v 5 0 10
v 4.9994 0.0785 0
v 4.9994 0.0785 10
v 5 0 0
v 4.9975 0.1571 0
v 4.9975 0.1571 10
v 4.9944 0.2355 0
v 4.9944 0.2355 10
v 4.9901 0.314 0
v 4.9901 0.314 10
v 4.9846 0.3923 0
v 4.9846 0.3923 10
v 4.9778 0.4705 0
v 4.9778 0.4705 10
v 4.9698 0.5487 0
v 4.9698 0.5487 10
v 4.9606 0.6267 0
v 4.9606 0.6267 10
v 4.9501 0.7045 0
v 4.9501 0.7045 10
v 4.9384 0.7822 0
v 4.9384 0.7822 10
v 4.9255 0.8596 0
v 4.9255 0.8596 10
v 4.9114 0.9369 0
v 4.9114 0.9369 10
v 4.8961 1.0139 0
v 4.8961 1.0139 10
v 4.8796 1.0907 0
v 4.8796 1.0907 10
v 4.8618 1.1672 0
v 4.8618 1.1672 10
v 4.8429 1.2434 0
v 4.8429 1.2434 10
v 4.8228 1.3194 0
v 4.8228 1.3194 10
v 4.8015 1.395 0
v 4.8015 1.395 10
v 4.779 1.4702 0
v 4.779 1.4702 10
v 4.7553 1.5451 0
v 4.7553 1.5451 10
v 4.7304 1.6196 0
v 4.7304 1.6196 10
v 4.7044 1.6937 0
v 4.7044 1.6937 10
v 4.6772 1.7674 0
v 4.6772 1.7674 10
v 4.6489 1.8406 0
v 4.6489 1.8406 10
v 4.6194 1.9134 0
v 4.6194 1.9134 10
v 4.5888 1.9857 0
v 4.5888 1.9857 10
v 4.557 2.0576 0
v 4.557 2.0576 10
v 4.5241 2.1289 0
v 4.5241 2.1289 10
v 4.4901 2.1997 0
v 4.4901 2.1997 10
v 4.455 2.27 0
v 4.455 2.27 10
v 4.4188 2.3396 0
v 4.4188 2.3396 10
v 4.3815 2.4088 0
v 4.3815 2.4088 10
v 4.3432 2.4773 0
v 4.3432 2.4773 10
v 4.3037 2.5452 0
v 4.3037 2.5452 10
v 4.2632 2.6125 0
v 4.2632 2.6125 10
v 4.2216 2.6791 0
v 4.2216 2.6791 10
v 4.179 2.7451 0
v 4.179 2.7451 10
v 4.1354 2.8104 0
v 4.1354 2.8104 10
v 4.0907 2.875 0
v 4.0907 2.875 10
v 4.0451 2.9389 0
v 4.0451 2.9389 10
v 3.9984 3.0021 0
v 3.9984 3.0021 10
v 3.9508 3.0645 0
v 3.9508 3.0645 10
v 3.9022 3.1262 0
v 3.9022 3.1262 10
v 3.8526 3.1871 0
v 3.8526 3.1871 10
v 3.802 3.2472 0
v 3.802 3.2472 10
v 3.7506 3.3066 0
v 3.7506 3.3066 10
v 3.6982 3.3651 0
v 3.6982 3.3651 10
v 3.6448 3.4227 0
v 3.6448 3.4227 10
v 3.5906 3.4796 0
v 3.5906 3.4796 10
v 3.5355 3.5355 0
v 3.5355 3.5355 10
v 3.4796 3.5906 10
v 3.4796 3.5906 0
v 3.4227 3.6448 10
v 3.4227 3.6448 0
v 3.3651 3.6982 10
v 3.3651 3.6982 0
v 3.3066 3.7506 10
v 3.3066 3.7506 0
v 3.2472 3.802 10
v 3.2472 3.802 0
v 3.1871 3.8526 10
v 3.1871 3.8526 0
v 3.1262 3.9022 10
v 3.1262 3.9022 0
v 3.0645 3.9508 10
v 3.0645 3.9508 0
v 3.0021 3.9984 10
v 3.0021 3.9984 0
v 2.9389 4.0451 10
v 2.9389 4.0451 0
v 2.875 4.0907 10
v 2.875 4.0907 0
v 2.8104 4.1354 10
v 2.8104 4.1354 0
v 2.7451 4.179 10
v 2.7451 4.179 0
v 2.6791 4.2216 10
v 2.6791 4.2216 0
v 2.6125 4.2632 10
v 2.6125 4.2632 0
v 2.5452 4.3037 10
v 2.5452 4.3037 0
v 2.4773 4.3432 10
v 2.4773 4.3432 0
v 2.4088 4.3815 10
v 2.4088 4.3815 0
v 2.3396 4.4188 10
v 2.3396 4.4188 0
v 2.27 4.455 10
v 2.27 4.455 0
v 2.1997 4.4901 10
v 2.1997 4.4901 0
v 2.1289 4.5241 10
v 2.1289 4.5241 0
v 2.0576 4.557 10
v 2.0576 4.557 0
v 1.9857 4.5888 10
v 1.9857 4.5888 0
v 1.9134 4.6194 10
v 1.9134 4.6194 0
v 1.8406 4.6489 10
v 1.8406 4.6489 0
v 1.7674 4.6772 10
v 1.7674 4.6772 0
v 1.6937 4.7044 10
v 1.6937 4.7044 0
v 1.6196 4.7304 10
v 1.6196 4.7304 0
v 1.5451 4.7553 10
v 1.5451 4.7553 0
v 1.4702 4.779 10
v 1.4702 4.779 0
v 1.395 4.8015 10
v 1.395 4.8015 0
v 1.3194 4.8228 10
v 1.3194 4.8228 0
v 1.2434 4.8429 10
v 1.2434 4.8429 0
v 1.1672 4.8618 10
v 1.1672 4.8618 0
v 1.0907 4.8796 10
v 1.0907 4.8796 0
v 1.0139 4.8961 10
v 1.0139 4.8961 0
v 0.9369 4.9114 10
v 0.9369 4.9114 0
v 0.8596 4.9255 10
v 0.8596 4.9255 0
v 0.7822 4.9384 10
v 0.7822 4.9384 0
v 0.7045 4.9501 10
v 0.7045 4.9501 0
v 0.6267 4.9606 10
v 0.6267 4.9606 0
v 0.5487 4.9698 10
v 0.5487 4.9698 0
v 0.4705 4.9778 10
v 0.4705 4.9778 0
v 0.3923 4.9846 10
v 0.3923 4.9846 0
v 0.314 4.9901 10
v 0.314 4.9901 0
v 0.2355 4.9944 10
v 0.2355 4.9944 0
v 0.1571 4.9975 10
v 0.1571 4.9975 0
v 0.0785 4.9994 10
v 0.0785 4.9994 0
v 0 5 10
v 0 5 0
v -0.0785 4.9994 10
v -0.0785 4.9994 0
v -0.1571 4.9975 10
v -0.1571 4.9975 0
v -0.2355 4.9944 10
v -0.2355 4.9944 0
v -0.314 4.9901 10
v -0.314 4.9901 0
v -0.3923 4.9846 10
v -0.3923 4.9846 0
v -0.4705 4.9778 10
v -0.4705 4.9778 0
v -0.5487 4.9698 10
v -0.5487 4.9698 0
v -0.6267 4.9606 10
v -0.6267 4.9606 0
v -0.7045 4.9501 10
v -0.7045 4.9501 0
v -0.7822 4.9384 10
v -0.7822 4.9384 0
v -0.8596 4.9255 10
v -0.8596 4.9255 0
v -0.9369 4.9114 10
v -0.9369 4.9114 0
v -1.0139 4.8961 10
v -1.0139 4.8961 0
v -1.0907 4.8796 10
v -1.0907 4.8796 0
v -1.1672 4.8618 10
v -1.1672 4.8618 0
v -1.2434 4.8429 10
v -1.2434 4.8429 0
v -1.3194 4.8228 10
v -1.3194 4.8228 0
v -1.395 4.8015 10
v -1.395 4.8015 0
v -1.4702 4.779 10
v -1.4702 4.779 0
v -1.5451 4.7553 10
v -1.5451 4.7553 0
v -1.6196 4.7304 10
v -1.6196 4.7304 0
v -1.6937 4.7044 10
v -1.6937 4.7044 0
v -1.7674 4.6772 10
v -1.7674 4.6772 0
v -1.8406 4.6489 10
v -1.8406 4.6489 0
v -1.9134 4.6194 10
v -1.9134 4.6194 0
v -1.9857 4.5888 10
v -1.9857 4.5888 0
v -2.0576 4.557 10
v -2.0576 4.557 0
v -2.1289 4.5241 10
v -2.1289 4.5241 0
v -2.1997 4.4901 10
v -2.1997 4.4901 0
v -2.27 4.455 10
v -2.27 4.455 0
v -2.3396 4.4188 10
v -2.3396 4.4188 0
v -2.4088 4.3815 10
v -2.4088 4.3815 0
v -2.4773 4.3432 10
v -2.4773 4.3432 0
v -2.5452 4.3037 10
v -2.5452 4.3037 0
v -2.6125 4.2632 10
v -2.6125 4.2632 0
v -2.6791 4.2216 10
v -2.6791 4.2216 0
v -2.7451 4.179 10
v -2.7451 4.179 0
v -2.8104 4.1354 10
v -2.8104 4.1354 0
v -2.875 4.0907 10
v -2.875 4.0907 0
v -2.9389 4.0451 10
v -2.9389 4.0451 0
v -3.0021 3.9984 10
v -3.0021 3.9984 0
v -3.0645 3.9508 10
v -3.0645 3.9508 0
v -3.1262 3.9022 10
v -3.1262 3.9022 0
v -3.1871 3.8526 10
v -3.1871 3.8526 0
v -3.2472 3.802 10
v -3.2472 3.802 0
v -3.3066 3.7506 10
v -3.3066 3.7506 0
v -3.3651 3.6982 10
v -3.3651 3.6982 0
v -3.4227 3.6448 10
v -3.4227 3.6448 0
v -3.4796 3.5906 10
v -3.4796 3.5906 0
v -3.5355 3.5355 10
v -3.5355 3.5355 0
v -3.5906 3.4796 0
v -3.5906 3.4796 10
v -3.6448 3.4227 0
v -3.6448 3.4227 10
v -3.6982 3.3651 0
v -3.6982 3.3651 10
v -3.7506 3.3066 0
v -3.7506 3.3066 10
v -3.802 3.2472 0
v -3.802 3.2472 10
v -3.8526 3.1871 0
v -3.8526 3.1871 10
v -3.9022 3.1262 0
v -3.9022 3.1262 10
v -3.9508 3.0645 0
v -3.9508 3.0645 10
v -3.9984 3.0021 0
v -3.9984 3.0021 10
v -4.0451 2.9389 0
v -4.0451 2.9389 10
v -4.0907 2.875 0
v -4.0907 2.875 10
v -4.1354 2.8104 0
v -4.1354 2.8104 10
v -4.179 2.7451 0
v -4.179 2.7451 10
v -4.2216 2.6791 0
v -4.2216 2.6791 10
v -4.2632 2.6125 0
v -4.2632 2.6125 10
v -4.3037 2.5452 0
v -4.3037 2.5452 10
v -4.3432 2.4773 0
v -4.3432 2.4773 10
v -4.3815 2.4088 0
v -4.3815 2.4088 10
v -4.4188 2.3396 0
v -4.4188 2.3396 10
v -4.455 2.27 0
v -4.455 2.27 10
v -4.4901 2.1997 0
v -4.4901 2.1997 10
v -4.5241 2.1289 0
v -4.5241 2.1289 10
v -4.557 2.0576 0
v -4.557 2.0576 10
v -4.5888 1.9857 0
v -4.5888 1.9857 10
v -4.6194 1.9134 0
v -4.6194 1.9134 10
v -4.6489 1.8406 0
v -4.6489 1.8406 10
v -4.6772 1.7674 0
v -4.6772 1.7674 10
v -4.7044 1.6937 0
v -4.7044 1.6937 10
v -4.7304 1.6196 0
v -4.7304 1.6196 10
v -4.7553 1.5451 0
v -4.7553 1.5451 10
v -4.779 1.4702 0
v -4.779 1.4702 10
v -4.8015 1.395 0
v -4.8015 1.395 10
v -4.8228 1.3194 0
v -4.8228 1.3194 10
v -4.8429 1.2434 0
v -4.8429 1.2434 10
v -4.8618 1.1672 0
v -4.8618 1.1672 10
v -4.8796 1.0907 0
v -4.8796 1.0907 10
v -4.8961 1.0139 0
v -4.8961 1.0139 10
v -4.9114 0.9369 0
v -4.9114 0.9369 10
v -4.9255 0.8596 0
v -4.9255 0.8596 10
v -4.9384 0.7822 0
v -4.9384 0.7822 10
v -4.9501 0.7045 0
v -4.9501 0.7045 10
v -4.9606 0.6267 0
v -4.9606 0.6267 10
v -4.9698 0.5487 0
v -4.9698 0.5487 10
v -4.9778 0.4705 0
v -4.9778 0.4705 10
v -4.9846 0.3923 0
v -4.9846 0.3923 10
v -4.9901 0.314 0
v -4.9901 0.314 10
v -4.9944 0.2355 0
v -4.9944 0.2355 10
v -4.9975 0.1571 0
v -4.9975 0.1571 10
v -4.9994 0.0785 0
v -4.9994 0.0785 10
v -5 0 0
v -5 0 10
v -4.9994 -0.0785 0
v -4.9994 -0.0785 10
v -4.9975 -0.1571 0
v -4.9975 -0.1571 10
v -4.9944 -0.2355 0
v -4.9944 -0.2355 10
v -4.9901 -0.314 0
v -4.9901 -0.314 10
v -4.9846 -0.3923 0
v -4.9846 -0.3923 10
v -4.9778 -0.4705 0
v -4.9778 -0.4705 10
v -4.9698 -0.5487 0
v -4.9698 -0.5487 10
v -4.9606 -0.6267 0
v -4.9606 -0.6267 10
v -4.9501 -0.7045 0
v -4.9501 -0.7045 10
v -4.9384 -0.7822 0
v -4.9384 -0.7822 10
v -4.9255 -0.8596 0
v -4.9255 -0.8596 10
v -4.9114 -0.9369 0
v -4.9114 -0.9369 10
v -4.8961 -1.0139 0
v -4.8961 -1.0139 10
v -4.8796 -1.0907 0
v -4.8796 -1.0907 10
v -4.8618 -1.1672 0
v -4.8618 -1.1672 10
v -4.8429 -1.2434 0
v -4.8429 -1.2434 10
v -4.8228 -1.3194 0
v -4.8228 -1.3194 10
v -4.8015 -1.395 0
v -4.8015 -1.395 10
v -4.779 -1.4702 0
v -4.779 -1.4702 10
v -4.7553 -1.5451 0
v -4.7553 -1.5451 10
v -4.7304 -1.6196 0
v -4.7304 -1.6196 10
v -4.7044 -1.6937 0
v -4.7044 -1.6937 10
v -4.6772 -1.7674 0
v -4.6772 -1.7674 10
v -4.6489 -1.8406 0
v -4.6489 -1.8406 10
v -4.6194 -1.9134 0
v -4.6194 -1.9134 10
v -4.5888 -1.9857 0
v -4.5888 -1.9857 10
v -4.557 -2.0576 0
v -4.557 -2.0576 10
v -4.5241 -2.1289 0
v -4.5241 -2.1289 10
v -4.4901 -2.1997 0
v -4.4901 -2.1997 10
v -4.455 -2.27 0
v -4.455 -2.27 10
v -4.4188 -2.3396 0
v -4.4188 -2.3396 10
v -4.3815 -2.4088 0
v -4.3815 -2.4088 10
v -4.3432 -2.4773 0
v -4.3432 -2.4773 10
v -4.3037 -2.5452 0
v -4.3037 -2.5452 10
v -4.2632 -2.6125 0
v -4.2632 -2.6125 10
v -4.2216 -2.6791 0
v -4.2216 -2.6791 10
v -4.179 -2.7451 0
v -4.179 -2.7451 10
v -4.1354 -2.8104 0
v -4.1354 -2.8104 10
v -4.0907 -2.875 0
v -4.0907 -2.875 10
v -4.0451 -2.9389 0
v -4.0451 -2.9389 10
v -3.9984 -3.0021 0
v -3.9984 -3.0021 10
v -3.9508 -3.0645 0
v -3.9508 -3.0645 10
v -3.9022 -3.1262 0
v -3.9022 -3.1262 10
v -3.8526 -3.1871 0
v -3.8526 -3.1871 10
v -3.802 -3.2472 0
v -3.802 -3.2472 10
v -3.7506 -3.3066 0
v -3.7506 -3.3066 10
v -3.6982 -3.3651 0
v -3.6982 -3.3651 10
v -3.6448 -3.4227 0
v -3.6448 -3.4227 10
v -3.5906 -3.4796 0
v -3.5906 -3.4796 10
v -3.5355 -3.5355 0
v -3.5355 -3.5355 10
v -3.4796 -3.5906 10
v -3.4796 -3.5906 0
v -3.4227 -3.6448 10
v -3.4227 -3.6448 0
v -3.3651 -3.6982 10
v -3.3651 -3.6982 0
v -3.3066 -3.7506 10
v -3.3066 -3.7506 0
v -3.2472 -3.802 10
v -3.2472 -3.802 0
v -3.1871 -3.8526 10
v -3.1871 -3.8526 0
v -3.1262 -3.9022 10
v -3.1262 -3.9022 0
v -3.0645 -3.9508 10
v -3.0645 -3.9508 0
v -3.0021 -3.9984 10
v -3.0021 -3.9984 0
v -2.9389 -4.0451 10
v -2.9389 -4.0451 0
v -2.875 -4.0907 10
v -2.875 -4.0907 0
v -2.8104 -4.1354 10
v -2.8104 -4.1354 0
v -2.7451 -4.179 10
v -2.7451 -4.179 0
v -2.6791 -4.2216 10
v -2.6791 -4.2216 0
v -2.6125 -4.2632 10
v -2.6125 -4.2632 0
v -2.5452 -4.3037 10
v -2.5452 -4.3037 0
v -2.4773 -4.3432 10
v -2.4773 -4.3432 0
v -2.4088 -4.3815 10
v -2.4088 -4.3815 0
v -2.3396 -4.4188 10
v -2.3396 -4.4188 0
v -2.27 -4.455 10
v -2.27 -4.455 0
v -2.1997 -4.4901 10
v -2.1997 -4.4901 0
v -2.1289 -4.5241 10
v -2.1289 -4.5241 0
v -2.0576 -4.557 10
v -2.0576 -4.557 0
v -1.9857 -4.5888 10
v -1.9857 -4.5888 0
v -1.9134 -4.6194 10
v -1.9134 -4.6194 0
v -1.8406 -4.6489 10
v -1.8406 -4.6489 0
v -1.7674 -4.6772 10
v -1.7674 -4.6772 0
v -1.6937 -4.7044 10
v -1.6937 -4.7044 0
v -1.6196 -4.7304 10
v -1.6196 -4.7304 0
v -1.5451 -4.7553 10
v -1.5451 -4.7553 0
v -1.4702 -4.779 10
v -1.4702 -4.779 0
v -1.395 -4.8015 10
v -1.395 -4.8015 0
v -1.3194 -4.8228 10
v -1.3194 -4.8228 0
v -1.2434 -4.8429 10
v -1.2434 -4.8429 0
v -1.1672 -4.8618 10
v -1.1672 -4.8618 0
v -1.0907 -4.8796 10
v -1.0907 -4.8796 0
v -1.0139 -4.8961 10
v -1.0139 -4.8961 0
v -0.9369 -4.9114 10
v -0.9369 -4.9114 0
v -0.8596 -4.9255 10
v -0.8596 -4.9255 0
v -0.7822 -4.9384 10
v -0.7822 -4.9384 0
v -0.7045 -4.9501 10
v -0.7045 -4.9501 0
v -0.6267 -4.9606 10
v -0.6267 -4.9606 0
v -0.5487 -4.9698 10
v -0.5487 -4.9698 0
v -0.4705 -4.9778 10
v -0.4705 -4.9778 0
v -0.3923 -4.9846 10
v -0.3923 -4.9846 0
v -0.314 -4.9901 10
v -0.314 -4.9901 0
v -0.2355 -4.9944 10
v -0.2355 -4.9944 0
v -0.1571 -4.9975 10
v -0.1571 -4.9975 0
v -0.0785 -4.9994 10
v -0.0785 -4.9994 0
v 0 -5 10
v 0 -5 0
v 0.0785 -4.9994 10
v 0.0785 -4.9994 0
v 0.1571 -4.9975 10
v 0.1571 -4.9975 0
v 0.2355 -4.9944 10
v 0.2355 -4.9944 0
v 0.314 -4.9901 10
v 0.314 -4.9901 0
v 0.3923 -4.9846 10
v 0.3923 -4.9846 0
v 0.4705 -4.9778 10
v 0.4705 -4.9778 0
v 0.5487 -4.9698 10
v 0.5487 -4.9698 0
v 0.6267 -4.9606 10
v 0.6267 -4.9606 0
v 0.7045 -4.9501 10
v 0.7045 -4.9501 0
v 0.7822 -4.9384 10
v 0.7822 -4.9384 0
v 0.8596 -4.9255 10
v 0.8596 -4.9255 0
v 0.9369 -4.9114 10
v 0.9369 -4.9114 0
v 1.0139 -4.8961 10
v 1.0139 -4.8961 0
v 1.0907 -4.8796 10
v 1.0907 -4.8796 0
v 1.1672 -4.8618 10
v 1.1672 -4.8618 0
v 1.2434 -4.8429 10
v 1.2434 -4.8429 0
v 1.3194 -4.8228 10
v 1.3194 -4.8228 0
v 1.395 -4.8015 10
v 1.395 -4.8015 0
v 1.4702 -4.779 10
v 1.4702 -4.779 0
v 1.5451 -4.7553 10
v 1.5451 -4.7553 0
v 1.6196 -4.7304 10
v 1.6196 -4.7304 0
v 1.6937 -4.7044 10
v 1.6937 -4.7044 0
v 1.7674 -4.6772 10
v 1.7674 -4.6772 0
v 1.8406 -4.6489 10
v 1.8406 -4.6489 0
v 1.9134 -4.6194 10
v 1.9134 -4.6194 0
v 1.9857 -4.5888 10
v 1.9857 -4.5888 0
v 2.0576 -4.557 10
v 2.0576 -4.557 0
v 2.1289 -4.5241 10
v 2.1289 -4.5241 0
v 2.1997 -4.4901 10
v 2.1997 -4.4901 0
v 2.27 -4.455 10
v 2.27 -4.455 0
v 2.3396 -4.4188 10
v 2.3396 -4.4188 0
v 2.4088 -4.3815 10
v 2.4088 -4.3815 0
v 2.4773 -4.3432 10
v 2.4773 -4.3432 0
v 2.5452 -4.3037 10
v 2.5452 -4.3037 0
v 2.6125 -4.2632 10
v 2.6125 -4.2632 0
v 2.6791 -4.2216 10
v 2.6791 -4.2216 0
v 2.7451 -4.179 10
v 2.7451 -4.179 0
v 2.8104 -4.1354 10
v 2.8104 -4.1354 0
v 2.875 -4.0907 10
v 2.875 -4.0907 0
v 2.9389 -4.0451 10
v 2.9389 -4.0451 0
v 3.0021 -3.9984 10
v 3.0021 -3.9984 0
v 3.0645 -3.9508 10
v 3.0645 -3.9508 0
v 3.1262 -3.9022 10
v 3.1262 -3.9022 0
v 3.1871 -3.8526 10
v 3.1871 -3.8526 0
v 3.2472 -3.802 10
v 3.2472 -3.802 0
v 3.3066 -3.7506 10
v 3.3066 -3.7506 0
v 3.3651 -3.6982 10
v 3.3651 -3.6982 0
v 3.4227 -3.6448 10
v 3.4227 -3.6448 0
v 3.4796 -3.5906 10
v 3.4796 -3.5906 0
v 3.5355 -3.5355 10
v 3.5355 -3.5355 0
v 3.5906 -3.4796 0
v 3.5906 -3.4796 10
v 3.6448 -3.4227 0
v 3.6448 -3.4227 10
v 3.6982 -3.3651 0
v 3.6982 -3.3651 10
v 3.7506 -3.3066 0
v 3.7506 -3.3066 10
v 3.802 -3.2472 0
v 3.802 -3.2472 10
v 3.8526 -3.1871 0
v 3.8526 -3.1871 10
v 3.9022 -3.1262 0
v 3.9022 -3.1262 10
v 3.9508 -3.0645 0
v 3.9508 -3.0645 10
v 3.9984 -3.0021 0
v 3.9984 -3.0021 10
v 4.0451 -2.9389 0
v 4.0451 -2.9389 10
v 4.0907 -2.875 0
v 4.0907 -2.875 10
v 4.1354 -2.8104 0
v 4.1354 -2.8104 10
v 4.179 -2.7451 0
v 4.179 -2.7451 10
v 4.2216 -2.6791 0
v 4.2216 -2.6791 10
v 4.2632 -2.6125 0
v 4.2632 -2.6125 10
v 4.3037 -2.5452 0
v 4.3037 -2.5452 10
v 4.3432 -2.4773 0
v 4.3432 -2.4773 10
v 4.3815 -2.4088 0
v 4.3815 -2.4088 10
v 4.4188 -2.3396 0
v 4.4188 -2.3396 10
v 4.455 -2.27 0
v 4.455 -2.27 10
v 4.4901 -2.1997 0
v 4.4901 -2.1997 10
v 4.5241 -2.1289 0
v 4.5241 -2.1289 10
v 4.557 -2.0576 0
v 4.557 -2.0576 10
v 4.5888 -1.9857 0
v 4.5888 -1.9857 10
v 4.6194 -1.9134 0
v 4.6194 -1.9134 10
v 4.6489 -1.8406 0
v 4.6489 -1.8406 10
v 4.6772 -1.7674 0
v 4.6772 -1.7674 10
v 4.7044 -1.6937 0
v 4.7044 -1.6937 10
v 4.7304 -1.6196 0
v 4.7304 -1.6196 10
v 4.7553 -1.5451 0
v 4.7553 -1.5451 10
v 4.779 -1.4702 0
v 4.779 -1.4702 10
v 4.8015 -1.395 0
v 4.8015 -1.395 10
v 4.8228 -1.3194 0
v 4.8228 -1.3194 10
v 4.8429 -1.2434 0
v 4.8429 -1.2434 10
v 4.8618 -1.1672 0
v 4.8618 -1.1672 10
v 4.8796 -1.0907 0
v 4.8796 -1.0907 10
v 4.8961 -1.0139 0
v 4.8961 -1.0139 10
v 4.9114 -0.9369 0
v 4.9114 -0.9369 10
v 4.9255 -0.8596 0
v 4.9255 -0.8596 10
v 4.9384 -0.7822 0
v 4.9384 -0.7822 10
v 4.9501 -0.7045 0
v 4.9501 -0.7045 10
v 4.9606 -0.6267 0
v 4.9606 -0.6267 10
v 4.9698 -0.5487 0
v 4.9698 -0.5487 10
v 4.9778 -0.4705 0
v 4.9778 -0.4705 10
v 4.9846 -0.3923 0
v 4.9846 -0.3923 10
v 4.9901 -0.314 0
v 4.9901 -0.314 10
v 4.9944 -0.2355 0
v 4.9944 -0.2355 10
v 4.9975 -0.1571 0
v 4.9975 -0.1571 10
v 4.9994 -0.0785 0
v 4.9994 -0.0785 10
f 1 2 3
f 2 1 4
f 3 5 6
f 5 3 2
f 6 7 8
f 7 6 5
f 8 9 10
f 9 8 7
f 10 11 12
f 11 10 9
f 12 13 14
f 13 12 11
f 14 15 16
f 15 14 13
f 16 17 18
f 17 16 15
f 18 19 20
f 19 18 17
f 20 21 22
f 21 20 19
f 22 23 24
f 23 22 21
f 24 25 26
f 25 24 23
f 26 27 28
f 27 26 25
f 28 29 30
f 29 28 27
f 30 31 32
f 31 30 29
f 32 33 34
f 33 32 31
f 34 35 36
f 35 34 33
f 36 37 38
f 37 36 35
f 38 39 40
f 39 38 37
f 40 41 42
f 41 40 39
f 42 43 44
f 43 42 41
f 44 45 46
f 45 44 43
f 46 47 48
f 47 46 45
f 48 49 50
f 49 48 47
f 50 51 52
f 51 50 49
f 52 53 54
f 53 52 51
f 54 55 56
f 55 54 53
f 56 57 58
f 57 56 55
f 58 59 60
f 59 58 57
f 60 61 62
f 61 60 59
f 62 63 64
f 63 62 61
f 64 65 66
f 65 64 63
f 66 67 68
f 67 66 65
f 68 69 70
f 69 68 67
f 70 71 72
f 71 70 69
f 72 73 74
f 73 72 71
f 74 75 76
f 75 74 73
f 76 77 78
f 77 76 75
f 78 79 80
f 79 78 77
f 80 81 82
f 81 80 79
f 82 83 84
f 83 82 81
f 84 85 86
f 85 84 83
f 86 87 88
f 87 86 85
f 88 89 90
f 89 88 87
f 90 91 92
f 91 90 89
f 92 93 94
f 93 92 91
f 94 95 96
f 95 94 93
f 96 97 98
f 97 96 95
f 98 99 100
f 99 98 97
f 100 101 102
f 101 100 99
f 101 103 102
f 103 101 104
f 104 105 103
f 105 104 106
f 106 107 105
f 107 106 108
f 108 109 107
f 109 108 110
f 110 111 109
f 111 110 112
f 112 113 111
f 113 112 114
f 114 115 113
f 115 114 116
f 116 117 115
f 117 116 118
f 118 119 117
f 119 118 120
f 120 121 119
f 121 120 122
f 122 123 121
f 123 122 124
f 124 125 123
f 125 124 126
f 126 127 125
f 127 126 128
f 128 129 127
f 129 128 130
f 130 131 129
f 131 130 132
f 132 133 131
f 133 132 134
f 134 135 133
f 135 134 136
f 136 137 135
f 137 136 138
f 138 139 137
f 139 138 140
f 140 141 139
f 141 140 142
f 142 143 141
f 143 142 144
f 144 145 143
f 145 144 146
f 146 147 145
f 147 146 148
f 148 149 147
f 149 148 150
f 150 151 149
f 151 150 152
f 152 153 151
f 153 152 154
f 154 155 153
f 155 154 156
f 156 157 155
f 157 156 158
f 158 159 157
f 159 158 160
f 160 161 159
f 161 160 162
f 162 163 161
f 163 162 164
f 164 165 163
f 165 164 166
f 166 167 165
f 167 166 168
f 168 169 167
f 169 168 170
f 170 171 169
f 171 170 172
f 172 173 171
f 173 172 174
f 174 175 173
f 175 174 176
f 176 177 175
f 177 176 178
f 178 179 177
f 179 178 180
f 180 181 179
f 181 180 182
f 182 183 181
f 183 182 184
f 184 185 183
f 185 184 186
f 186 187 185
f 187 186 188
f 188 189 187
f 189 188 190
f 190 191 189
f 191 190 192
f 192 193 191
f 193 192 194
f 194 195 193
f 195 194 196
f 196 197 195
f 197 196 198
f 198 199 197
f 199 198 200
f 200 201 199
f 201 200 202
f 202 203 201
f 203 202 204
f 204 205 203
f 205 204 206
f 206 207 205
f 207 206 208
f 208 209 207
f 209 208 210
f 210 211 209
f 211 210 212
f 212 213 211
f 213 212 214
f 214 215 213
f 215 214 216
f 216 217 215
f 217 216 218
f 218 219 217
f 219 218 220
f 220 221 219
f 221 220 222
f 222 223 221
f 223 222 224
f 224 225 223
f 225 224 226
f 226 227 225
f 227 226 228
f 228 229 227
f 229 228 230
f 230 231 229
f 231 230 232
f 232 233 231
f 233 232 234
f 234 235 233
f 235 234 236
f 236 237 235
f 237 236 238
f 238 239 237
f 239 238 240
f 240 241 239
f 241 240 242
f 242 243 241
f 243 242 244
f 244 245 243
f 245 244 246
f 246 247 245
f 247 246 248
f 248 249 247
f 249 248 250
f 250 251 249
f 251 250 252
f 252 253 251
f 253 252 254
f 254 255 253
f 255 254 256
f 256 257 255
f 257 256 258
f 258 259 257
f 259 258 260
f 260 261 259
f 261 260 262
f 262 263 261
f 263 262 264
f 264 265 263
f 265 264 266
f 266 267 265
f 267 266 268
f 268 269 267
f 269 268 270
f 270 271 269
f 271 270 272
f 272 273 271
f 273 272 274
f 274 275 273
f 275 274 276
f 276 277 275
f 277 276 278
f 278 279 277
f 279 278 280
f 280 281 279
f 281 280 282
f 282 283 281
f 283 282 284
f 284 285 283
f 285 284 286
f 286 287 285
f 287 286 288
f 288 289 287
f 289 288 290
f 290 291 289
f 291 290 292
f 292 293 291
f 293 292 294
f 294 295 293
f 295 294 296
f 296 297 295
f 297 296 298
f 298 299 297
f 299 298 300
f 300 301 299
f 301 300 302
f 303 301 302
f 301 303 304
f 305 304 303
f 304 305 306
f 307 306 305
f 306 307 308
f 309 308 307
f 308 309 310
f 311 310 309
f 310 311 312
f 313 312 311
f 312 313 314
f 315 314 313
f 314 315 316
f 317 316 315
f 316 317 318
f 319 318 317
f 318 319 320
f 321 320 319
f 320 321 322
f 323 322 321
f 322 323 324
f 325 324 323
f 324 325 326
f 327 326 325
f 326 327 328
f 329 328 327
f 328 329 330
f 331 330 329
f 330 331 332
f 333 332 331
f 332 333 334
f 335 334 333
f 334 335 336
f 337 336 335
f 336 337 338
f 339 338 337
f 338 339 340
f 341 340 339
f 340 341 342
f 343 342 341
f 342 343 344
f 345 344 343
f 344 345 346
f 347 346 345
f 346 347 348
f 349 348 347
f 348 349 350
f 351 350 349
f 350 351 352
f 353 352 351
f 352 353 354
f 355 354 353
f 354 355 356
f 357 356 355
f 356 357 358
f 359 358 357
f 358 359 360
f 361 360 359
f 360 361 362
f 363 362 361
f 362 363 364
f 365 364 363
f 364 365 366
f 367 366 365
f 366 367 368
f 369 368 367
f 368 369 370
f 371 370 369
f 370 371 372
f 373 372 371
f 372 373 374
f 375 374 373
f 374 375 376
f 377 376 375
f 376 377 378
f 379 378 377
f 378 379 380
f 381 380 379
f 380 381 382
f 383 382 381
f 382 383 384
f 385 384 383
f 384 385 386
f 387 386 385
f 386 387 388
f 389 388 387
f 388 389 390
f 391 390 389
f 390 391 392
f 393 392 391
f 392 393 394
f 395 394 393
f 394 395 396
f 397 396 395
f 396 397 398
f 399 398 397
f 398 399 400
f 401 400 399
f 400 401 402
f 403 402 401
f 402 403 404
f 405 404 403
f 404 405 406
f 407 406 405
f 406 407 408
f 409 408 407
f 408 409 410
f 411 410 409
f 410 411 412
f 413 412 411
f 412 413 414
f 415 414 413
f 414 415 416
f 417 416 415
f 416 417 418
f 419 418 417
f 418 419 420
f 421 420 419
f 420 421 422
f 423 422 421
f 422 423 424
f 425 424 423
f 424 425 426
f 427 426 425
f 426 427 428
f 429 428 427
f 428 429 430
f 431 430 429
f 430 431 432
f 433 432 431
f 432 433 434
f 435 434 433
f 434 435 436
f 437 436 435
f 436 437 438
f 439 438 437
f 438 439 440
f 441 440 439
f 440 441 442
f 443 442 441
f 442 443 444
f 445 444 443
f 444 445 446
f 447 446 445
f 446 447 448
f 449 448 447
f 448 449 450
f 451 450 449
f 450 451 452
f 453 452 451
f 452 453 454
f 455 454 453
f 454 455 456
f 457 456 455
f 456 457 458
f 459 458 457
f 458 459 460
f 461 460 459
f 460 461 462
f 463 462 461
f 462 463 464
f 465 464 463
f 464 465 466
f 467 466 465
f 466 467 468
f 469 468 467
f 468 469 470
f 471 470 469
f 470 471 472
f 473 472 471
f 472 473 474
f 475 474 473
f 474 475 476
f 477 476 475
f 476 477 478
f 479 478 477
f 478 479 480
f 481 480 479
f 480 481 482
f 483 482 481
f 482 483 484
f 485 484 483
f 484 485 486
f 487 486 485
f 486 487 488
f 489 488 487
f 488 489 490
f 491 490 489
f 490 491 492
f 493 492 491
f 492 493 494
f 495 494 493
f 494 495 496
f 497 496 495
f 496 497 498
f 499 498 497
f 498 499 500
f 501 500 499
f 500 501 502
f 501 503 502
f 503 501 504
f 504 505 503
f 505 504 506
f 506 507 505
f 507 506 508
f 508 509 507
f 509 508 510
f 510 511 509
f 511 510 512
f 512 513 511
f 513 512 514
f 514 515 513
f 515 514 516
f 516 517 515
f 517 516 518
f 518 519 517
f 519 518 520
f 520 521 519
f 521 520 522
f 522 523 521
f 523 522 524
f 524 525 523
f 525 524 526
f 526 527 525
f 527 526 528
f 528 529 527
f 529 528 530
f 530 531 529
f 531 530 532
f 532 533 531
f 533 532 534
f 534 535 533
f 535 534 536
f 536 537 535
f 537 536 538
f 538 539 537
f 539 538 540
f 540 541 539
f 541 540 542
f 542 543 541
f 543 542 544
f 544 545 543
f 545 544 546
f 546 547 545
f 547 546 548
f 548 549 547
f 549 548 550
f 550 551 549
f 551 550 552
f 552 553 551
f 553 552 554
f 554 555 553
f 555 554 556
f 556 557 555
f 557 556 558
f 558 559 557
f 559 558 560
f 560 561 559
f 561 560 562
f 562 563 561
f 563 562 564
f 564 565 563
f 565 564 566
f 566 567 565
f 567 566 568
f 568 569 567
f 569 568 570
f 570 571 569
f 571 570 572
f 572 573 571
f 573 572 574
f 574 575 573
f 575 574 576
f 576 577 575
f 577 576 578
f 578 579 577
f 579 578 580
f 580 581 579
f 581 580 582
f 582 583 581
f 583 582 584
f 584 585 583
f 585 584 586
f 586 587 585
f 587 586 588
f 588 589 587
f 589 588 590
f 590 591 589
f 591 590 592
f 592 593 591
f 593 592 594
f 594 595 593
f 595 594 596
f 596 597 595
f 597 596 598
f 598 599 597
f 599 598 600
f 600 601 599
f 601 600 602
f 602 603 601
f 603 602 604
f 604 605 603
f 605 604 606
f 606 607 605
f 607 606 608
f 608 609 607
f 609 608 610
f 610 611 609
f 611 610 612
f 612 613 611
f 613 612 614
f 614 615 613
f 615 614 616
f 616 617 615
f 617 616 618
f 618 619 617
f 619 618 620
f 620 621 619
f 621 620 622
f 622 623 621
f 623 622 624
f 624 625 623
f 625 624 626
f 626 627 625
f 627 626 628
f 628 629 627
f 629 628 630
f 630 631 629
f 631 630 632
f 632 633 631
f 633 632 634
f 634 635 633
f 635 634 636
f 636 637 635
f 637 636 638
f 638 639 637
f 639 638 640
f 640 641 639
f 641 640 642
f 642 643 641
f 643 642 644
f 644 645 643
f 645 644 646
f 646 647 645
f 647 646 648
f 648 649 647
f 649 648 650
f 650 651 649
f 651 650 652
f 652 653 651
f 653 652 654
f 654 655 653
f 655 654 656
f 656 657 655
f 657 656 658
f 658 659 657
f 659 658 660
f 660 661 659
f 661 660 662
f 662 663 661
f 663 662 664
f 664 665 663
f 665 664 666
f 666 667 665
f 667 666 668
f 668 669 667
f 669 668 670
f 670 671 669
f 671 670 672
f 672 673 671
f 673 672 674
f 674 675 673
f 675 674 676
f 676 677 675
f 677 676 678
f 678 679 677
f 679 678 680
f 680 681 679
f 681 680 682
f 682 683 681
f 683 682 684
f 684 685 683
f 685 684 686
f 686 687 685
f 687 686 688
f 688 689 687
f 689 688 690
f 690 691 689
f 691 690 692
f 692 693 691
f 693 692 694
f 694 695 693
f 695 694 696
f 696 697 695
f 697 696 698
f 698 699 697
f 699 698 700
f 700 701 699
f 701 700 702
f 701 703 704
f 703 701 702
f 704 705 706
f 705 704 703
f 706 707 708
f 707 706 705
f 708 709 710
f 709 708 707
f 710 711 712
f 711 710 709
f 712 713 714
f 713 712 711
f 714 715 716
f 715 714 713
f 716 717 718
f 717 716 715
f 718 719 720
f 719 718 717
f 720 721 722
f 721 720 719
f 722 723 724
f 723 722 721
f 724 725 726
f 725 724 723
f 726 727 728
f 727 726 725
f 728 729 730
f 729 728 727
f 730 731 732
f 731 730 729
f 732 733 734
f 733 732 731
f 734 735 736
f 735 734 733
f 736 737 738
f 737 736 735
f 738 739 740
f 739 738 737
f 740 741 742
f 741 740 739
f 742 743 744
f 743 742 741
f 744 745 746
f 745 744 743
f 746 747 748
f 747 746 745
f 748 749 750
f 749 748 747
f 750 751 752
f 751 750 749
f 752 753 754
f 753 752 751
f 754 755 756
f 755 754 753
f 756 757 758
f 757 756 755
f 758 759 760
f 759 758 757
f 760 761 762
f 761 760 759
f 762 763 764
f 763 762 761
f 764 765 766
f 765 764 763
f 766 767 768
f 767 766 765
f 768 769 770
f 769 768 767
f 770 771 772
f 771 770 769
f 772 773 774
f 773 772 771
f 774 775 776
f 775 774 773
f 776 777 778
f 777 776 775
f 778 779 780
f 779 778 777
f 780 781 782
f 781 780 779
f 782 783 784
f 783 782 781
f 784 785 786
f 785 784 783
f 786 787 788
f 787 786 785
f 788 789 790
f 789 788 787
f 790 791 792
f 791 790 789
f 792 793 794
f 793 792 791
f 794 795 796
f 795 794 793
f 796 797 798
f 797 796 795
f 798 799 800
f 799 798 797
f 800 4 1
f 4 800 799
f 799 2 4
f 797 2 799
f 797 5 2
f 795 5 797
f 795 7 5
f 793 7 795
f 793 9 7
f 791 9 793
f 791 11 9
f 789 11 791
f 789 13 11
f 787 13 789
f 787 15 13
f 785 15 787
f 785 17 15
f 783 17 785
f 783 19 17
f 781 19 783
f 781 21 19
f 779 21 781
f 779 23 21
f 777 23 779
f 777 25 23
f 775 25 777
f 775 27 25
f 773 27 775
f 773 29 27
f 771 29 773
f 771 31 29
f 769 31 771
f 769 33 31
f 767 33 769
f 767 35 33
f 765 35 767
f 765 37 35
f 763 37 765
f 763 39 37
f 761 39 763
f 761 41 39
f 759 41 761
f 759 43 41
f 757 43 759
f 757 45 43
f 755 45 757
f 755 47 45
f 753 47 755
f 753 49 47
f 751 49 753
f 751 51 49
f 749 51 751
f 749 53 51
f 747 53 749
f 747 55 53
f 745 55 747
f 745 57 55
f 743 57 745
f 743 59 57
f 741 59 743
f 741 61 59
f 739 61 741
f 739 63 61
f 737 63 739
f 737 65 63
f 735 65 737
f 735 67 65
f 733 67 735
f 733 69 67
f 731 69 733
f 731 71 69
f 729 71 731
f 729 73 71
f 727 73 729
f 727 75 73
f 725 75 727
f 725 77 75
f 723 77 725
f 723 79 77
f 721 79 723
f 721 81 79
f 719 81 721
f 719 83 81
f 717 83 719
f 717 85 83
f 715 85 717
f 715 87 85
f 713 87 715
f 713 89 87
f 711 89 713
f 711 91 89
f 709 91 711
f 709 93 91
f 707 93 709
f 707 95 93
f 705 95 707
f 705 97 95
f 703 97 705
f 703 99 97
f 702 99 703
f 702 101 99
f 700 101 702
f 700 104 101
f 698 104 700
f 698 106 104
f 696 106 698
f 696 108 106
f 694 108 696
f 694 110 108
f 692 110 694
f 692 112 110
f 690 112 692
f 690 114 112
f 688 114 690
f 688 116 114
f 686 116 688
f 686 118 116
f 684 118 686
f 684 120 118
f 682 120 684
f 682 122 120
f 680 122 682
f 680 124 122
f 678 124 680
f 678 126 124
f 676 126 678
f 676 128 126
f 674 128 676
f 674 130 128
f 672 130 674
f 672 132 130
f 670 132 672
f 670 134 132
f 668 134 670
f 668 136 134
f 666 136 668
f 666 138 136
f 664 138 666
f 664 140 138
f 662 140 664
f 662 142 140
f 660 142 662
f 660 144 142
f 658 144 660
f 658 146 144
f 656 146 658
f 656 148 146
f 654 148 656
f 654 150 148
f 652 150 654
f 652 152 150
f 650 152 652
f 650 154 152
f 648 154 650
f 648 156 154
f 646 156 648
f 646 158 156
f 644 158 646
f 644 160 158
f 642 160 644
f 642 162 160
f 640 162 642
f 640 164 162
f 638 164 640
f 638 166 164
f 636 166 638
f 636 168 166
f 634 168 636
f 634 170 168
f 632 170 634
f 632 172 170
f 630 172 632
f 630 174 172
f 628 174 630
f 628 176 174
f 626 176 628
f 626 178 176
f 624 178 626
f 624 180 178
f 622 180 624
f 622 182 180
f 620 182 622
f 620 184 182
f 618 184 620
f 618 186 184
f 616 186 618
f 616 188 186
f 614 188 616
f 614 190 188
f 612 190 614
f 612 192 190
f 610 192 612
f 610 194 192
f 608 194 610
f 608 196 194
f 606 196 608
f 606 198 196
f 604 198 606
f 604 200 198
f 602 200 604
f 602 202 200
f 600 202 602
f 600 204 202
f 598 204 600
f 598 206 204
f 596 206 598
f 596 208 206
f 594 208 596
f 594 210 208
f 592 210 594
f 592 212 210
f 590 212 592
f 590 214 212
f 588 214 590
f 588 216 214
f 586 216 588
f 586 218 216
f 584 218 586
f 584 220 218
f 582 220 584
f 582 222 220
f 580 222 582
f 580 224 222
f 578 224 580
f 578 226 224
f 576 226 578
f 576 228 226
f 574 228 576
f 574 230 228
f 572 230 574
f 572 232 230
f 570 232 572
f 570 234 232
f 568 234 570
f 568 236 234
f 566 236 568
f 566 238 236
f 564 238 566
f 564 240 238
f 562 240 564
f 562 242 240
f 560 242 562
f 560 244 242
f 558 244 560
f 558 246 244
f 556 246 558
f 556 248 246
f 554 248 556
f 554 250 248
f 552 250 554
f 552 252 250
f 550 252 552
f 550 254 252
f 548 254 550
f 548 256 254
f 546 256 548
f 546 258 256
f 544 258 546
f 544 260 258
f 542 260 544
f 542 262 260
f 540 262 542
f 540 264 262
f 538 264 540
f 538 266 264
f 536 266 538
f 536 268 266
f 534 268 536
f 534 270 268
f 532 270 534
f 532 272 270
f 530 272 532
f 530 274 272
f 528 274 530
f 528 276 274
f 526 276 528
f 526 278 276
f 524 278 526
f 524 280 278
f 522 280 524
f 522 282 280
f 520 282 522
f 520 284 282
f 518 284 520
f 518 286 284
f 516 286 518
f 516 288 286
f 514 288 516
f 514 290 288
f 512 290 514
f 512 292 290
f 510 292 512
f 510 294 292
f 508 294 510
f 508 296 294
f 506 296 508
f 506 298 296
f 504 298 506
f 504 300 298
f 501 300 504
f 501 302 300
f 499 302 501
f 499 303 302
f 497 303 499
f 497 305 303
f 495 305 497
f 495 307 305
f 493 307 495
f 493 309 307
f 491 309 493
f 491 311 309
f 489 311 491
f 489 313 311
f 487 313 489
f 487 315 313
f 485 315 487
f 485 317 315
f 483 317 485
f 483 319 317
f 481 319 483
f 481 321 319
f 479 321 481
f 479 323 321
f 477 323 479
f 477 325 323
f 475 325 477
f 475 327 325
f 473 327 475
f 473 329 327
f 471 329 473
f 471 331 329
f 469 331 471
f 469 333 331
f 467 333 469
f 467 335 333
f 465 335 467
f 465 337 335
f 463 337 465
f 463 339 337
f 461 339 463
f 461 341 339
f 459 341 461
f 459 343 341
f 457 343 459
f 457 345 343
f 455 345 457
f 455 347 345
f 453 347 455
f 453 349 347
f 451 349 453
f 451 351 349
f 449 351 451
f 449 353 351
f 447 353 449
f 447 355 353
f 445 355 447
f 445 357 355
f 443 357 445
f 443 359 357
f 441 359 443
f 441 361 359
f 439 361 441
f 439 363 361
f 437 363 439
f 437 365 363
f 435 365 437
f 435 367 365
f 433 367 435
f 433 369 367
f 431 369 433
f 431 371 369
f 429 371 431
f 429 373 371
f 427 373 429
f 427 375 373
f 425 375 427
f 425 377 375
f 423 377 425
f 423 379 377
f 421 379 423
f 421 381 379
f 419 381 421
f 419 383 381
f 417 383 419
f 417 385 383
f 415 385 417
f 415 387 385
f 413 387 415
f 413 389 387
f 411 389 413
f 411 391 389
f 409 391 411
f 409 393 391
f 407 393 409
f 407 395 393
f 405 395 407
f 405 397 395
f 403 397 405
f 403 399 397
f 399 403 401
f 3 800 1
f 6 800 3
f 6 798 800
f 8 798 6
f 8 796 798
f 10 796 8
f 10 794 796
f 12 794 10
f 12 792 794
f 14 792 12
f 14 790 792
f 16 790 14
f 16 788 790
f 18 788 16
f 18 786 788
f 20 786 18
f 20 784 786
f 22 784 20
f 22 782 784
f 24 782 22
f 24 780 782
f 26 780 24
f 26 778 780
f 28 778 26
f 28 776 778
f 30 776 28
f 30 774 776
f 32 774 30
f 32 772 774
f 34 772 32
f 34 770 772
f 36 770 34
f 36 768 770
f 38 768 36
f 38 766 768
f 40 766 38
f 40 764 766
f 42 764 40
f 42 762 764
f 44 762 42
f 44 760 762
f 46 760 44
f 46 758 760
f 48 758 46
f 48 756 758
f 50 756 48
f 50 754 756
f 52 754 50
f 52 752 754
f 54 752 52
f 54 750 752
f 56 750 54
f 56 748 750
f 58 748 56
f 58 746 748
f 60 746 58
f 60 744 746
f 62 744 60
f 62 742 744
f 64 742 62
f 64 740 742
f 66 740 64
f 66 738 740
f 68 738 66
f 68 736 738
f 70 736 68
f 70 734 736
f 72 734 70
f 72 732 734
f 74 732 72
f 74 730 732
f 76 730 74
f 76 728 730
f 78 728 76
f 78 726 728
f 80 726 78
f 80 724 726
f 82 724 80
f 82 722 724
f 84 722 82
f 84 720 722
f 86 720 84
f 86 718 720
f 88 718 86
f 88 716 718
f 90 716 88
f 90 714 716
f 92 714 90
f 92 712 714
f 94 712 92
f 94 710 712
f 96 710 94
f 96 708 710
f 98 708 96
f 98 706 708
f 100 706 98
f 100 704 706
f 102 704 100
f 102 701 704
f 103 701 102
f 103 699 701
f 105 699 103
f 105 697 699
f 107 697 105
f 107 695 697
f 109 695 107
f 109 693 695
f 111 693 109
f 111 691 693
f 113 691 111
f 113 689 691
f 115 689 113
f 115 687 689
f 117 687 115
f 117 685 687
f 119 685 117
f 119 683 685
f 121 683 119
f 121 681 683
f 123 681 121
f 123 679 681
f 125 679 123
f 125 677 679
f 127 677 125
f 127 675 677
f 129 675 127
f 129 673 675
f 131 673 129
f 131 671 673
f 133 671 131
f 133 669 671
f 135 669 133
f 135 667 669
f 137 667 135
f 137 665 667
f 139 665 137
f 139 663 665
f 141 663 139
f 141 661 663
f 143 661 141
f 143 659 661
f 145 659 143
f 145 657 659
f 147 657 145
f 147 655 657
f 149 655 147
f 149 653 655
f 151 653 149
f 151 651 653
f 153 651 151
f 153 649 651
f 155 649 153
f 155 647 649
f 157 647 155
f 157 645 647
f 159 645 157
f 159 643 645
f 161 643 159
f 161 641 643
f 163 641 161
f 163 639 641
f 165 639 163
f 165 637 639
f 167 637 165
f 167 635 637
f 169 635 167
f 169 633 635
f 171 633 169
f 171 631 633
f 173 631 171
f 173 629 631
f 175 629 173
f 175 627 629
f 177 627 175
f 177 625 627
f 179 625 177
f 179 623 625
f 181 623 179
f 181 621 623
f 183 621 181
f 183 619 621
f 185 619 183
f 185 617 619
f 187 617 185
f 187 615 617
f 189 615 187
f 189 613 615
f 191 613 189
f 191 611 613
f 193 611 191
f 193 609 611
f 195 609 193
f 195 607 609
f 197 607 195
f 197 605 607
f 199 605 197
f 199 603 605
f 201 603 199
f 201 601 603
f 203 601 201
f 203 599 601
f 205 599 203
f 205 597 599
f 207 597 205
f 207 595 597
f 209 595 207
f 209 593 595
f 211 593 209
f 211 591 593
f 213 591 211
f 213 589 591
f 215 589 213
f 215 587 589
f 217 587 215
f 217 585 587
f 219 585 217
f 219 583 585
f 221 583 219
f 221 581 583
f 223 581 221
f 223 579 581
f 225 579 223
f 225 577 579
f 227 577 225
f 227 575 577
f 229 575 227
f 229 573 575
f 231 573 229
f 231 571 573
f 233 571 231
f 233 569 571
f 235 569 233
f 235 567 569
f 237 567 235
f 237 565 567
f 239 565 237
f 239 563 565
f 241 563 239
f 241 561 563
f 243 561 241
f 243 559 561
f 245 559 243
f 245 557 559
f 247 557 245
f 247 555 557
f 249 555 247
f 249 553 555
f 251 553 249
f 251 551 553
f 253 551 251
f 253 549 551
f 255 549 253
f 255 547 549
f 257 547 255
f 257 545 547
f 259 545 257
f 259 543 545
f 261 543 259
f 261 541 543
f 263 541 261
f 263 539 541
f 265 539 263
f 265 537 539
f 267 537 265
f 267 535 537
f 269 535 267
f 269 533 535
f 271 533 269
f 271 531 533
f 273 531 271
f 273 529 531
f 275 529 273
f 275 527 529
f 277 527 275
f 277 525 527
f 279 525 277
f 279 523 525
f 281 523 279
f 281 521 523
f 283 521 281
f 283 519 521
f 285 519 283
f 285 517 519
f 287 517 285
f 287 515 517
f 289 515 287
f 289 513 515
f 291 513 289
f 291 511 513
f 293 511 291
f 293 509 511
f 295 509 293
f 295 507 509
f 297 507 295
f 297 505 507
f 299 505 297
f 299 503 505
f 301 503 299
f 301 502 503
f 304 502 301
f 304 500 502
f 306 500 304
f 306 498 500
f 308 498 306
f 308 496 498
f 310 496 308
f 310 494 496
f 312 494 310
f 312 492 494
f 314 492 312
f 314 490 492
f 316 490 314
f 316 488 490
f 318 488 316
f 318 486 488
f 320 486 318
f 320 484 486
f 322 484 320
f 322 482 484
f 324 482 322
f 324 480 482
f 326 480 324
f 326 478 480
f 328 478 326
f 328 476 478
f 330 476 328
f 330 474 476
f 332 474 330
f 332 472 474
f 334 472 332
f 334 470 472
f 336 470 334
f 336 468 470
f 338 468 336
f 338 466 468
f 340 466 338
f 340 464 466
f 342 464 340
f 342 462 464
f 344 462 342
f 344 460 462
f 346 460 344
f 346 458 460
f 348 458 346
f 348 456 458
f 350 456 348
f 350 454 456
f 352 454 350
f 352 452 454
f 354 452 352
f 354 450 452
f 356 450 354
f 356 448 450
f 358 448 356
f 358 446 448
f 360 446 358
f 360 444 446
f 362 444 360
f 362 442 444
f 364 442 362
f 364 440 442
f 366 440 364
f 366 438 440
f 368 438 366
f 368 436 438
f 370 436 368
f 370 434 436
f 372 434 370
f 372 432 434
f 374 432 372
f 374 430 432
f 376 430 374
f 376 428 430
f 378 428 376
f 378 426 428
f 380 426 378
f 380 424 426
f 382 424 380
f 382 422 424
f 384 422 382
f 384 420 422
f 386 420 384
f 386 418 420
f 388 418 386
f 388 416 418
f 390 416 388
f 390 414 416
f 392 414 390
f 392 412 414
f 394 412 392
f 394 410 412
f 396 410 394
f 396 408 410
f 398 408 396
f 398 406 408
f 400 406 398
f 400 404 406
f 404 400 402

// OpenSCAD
// mesh.ts clamps $fn to MAX_FN=256. The tree should still carry 400.
cylinder(h = 10, r = 5, $fn = 400);
